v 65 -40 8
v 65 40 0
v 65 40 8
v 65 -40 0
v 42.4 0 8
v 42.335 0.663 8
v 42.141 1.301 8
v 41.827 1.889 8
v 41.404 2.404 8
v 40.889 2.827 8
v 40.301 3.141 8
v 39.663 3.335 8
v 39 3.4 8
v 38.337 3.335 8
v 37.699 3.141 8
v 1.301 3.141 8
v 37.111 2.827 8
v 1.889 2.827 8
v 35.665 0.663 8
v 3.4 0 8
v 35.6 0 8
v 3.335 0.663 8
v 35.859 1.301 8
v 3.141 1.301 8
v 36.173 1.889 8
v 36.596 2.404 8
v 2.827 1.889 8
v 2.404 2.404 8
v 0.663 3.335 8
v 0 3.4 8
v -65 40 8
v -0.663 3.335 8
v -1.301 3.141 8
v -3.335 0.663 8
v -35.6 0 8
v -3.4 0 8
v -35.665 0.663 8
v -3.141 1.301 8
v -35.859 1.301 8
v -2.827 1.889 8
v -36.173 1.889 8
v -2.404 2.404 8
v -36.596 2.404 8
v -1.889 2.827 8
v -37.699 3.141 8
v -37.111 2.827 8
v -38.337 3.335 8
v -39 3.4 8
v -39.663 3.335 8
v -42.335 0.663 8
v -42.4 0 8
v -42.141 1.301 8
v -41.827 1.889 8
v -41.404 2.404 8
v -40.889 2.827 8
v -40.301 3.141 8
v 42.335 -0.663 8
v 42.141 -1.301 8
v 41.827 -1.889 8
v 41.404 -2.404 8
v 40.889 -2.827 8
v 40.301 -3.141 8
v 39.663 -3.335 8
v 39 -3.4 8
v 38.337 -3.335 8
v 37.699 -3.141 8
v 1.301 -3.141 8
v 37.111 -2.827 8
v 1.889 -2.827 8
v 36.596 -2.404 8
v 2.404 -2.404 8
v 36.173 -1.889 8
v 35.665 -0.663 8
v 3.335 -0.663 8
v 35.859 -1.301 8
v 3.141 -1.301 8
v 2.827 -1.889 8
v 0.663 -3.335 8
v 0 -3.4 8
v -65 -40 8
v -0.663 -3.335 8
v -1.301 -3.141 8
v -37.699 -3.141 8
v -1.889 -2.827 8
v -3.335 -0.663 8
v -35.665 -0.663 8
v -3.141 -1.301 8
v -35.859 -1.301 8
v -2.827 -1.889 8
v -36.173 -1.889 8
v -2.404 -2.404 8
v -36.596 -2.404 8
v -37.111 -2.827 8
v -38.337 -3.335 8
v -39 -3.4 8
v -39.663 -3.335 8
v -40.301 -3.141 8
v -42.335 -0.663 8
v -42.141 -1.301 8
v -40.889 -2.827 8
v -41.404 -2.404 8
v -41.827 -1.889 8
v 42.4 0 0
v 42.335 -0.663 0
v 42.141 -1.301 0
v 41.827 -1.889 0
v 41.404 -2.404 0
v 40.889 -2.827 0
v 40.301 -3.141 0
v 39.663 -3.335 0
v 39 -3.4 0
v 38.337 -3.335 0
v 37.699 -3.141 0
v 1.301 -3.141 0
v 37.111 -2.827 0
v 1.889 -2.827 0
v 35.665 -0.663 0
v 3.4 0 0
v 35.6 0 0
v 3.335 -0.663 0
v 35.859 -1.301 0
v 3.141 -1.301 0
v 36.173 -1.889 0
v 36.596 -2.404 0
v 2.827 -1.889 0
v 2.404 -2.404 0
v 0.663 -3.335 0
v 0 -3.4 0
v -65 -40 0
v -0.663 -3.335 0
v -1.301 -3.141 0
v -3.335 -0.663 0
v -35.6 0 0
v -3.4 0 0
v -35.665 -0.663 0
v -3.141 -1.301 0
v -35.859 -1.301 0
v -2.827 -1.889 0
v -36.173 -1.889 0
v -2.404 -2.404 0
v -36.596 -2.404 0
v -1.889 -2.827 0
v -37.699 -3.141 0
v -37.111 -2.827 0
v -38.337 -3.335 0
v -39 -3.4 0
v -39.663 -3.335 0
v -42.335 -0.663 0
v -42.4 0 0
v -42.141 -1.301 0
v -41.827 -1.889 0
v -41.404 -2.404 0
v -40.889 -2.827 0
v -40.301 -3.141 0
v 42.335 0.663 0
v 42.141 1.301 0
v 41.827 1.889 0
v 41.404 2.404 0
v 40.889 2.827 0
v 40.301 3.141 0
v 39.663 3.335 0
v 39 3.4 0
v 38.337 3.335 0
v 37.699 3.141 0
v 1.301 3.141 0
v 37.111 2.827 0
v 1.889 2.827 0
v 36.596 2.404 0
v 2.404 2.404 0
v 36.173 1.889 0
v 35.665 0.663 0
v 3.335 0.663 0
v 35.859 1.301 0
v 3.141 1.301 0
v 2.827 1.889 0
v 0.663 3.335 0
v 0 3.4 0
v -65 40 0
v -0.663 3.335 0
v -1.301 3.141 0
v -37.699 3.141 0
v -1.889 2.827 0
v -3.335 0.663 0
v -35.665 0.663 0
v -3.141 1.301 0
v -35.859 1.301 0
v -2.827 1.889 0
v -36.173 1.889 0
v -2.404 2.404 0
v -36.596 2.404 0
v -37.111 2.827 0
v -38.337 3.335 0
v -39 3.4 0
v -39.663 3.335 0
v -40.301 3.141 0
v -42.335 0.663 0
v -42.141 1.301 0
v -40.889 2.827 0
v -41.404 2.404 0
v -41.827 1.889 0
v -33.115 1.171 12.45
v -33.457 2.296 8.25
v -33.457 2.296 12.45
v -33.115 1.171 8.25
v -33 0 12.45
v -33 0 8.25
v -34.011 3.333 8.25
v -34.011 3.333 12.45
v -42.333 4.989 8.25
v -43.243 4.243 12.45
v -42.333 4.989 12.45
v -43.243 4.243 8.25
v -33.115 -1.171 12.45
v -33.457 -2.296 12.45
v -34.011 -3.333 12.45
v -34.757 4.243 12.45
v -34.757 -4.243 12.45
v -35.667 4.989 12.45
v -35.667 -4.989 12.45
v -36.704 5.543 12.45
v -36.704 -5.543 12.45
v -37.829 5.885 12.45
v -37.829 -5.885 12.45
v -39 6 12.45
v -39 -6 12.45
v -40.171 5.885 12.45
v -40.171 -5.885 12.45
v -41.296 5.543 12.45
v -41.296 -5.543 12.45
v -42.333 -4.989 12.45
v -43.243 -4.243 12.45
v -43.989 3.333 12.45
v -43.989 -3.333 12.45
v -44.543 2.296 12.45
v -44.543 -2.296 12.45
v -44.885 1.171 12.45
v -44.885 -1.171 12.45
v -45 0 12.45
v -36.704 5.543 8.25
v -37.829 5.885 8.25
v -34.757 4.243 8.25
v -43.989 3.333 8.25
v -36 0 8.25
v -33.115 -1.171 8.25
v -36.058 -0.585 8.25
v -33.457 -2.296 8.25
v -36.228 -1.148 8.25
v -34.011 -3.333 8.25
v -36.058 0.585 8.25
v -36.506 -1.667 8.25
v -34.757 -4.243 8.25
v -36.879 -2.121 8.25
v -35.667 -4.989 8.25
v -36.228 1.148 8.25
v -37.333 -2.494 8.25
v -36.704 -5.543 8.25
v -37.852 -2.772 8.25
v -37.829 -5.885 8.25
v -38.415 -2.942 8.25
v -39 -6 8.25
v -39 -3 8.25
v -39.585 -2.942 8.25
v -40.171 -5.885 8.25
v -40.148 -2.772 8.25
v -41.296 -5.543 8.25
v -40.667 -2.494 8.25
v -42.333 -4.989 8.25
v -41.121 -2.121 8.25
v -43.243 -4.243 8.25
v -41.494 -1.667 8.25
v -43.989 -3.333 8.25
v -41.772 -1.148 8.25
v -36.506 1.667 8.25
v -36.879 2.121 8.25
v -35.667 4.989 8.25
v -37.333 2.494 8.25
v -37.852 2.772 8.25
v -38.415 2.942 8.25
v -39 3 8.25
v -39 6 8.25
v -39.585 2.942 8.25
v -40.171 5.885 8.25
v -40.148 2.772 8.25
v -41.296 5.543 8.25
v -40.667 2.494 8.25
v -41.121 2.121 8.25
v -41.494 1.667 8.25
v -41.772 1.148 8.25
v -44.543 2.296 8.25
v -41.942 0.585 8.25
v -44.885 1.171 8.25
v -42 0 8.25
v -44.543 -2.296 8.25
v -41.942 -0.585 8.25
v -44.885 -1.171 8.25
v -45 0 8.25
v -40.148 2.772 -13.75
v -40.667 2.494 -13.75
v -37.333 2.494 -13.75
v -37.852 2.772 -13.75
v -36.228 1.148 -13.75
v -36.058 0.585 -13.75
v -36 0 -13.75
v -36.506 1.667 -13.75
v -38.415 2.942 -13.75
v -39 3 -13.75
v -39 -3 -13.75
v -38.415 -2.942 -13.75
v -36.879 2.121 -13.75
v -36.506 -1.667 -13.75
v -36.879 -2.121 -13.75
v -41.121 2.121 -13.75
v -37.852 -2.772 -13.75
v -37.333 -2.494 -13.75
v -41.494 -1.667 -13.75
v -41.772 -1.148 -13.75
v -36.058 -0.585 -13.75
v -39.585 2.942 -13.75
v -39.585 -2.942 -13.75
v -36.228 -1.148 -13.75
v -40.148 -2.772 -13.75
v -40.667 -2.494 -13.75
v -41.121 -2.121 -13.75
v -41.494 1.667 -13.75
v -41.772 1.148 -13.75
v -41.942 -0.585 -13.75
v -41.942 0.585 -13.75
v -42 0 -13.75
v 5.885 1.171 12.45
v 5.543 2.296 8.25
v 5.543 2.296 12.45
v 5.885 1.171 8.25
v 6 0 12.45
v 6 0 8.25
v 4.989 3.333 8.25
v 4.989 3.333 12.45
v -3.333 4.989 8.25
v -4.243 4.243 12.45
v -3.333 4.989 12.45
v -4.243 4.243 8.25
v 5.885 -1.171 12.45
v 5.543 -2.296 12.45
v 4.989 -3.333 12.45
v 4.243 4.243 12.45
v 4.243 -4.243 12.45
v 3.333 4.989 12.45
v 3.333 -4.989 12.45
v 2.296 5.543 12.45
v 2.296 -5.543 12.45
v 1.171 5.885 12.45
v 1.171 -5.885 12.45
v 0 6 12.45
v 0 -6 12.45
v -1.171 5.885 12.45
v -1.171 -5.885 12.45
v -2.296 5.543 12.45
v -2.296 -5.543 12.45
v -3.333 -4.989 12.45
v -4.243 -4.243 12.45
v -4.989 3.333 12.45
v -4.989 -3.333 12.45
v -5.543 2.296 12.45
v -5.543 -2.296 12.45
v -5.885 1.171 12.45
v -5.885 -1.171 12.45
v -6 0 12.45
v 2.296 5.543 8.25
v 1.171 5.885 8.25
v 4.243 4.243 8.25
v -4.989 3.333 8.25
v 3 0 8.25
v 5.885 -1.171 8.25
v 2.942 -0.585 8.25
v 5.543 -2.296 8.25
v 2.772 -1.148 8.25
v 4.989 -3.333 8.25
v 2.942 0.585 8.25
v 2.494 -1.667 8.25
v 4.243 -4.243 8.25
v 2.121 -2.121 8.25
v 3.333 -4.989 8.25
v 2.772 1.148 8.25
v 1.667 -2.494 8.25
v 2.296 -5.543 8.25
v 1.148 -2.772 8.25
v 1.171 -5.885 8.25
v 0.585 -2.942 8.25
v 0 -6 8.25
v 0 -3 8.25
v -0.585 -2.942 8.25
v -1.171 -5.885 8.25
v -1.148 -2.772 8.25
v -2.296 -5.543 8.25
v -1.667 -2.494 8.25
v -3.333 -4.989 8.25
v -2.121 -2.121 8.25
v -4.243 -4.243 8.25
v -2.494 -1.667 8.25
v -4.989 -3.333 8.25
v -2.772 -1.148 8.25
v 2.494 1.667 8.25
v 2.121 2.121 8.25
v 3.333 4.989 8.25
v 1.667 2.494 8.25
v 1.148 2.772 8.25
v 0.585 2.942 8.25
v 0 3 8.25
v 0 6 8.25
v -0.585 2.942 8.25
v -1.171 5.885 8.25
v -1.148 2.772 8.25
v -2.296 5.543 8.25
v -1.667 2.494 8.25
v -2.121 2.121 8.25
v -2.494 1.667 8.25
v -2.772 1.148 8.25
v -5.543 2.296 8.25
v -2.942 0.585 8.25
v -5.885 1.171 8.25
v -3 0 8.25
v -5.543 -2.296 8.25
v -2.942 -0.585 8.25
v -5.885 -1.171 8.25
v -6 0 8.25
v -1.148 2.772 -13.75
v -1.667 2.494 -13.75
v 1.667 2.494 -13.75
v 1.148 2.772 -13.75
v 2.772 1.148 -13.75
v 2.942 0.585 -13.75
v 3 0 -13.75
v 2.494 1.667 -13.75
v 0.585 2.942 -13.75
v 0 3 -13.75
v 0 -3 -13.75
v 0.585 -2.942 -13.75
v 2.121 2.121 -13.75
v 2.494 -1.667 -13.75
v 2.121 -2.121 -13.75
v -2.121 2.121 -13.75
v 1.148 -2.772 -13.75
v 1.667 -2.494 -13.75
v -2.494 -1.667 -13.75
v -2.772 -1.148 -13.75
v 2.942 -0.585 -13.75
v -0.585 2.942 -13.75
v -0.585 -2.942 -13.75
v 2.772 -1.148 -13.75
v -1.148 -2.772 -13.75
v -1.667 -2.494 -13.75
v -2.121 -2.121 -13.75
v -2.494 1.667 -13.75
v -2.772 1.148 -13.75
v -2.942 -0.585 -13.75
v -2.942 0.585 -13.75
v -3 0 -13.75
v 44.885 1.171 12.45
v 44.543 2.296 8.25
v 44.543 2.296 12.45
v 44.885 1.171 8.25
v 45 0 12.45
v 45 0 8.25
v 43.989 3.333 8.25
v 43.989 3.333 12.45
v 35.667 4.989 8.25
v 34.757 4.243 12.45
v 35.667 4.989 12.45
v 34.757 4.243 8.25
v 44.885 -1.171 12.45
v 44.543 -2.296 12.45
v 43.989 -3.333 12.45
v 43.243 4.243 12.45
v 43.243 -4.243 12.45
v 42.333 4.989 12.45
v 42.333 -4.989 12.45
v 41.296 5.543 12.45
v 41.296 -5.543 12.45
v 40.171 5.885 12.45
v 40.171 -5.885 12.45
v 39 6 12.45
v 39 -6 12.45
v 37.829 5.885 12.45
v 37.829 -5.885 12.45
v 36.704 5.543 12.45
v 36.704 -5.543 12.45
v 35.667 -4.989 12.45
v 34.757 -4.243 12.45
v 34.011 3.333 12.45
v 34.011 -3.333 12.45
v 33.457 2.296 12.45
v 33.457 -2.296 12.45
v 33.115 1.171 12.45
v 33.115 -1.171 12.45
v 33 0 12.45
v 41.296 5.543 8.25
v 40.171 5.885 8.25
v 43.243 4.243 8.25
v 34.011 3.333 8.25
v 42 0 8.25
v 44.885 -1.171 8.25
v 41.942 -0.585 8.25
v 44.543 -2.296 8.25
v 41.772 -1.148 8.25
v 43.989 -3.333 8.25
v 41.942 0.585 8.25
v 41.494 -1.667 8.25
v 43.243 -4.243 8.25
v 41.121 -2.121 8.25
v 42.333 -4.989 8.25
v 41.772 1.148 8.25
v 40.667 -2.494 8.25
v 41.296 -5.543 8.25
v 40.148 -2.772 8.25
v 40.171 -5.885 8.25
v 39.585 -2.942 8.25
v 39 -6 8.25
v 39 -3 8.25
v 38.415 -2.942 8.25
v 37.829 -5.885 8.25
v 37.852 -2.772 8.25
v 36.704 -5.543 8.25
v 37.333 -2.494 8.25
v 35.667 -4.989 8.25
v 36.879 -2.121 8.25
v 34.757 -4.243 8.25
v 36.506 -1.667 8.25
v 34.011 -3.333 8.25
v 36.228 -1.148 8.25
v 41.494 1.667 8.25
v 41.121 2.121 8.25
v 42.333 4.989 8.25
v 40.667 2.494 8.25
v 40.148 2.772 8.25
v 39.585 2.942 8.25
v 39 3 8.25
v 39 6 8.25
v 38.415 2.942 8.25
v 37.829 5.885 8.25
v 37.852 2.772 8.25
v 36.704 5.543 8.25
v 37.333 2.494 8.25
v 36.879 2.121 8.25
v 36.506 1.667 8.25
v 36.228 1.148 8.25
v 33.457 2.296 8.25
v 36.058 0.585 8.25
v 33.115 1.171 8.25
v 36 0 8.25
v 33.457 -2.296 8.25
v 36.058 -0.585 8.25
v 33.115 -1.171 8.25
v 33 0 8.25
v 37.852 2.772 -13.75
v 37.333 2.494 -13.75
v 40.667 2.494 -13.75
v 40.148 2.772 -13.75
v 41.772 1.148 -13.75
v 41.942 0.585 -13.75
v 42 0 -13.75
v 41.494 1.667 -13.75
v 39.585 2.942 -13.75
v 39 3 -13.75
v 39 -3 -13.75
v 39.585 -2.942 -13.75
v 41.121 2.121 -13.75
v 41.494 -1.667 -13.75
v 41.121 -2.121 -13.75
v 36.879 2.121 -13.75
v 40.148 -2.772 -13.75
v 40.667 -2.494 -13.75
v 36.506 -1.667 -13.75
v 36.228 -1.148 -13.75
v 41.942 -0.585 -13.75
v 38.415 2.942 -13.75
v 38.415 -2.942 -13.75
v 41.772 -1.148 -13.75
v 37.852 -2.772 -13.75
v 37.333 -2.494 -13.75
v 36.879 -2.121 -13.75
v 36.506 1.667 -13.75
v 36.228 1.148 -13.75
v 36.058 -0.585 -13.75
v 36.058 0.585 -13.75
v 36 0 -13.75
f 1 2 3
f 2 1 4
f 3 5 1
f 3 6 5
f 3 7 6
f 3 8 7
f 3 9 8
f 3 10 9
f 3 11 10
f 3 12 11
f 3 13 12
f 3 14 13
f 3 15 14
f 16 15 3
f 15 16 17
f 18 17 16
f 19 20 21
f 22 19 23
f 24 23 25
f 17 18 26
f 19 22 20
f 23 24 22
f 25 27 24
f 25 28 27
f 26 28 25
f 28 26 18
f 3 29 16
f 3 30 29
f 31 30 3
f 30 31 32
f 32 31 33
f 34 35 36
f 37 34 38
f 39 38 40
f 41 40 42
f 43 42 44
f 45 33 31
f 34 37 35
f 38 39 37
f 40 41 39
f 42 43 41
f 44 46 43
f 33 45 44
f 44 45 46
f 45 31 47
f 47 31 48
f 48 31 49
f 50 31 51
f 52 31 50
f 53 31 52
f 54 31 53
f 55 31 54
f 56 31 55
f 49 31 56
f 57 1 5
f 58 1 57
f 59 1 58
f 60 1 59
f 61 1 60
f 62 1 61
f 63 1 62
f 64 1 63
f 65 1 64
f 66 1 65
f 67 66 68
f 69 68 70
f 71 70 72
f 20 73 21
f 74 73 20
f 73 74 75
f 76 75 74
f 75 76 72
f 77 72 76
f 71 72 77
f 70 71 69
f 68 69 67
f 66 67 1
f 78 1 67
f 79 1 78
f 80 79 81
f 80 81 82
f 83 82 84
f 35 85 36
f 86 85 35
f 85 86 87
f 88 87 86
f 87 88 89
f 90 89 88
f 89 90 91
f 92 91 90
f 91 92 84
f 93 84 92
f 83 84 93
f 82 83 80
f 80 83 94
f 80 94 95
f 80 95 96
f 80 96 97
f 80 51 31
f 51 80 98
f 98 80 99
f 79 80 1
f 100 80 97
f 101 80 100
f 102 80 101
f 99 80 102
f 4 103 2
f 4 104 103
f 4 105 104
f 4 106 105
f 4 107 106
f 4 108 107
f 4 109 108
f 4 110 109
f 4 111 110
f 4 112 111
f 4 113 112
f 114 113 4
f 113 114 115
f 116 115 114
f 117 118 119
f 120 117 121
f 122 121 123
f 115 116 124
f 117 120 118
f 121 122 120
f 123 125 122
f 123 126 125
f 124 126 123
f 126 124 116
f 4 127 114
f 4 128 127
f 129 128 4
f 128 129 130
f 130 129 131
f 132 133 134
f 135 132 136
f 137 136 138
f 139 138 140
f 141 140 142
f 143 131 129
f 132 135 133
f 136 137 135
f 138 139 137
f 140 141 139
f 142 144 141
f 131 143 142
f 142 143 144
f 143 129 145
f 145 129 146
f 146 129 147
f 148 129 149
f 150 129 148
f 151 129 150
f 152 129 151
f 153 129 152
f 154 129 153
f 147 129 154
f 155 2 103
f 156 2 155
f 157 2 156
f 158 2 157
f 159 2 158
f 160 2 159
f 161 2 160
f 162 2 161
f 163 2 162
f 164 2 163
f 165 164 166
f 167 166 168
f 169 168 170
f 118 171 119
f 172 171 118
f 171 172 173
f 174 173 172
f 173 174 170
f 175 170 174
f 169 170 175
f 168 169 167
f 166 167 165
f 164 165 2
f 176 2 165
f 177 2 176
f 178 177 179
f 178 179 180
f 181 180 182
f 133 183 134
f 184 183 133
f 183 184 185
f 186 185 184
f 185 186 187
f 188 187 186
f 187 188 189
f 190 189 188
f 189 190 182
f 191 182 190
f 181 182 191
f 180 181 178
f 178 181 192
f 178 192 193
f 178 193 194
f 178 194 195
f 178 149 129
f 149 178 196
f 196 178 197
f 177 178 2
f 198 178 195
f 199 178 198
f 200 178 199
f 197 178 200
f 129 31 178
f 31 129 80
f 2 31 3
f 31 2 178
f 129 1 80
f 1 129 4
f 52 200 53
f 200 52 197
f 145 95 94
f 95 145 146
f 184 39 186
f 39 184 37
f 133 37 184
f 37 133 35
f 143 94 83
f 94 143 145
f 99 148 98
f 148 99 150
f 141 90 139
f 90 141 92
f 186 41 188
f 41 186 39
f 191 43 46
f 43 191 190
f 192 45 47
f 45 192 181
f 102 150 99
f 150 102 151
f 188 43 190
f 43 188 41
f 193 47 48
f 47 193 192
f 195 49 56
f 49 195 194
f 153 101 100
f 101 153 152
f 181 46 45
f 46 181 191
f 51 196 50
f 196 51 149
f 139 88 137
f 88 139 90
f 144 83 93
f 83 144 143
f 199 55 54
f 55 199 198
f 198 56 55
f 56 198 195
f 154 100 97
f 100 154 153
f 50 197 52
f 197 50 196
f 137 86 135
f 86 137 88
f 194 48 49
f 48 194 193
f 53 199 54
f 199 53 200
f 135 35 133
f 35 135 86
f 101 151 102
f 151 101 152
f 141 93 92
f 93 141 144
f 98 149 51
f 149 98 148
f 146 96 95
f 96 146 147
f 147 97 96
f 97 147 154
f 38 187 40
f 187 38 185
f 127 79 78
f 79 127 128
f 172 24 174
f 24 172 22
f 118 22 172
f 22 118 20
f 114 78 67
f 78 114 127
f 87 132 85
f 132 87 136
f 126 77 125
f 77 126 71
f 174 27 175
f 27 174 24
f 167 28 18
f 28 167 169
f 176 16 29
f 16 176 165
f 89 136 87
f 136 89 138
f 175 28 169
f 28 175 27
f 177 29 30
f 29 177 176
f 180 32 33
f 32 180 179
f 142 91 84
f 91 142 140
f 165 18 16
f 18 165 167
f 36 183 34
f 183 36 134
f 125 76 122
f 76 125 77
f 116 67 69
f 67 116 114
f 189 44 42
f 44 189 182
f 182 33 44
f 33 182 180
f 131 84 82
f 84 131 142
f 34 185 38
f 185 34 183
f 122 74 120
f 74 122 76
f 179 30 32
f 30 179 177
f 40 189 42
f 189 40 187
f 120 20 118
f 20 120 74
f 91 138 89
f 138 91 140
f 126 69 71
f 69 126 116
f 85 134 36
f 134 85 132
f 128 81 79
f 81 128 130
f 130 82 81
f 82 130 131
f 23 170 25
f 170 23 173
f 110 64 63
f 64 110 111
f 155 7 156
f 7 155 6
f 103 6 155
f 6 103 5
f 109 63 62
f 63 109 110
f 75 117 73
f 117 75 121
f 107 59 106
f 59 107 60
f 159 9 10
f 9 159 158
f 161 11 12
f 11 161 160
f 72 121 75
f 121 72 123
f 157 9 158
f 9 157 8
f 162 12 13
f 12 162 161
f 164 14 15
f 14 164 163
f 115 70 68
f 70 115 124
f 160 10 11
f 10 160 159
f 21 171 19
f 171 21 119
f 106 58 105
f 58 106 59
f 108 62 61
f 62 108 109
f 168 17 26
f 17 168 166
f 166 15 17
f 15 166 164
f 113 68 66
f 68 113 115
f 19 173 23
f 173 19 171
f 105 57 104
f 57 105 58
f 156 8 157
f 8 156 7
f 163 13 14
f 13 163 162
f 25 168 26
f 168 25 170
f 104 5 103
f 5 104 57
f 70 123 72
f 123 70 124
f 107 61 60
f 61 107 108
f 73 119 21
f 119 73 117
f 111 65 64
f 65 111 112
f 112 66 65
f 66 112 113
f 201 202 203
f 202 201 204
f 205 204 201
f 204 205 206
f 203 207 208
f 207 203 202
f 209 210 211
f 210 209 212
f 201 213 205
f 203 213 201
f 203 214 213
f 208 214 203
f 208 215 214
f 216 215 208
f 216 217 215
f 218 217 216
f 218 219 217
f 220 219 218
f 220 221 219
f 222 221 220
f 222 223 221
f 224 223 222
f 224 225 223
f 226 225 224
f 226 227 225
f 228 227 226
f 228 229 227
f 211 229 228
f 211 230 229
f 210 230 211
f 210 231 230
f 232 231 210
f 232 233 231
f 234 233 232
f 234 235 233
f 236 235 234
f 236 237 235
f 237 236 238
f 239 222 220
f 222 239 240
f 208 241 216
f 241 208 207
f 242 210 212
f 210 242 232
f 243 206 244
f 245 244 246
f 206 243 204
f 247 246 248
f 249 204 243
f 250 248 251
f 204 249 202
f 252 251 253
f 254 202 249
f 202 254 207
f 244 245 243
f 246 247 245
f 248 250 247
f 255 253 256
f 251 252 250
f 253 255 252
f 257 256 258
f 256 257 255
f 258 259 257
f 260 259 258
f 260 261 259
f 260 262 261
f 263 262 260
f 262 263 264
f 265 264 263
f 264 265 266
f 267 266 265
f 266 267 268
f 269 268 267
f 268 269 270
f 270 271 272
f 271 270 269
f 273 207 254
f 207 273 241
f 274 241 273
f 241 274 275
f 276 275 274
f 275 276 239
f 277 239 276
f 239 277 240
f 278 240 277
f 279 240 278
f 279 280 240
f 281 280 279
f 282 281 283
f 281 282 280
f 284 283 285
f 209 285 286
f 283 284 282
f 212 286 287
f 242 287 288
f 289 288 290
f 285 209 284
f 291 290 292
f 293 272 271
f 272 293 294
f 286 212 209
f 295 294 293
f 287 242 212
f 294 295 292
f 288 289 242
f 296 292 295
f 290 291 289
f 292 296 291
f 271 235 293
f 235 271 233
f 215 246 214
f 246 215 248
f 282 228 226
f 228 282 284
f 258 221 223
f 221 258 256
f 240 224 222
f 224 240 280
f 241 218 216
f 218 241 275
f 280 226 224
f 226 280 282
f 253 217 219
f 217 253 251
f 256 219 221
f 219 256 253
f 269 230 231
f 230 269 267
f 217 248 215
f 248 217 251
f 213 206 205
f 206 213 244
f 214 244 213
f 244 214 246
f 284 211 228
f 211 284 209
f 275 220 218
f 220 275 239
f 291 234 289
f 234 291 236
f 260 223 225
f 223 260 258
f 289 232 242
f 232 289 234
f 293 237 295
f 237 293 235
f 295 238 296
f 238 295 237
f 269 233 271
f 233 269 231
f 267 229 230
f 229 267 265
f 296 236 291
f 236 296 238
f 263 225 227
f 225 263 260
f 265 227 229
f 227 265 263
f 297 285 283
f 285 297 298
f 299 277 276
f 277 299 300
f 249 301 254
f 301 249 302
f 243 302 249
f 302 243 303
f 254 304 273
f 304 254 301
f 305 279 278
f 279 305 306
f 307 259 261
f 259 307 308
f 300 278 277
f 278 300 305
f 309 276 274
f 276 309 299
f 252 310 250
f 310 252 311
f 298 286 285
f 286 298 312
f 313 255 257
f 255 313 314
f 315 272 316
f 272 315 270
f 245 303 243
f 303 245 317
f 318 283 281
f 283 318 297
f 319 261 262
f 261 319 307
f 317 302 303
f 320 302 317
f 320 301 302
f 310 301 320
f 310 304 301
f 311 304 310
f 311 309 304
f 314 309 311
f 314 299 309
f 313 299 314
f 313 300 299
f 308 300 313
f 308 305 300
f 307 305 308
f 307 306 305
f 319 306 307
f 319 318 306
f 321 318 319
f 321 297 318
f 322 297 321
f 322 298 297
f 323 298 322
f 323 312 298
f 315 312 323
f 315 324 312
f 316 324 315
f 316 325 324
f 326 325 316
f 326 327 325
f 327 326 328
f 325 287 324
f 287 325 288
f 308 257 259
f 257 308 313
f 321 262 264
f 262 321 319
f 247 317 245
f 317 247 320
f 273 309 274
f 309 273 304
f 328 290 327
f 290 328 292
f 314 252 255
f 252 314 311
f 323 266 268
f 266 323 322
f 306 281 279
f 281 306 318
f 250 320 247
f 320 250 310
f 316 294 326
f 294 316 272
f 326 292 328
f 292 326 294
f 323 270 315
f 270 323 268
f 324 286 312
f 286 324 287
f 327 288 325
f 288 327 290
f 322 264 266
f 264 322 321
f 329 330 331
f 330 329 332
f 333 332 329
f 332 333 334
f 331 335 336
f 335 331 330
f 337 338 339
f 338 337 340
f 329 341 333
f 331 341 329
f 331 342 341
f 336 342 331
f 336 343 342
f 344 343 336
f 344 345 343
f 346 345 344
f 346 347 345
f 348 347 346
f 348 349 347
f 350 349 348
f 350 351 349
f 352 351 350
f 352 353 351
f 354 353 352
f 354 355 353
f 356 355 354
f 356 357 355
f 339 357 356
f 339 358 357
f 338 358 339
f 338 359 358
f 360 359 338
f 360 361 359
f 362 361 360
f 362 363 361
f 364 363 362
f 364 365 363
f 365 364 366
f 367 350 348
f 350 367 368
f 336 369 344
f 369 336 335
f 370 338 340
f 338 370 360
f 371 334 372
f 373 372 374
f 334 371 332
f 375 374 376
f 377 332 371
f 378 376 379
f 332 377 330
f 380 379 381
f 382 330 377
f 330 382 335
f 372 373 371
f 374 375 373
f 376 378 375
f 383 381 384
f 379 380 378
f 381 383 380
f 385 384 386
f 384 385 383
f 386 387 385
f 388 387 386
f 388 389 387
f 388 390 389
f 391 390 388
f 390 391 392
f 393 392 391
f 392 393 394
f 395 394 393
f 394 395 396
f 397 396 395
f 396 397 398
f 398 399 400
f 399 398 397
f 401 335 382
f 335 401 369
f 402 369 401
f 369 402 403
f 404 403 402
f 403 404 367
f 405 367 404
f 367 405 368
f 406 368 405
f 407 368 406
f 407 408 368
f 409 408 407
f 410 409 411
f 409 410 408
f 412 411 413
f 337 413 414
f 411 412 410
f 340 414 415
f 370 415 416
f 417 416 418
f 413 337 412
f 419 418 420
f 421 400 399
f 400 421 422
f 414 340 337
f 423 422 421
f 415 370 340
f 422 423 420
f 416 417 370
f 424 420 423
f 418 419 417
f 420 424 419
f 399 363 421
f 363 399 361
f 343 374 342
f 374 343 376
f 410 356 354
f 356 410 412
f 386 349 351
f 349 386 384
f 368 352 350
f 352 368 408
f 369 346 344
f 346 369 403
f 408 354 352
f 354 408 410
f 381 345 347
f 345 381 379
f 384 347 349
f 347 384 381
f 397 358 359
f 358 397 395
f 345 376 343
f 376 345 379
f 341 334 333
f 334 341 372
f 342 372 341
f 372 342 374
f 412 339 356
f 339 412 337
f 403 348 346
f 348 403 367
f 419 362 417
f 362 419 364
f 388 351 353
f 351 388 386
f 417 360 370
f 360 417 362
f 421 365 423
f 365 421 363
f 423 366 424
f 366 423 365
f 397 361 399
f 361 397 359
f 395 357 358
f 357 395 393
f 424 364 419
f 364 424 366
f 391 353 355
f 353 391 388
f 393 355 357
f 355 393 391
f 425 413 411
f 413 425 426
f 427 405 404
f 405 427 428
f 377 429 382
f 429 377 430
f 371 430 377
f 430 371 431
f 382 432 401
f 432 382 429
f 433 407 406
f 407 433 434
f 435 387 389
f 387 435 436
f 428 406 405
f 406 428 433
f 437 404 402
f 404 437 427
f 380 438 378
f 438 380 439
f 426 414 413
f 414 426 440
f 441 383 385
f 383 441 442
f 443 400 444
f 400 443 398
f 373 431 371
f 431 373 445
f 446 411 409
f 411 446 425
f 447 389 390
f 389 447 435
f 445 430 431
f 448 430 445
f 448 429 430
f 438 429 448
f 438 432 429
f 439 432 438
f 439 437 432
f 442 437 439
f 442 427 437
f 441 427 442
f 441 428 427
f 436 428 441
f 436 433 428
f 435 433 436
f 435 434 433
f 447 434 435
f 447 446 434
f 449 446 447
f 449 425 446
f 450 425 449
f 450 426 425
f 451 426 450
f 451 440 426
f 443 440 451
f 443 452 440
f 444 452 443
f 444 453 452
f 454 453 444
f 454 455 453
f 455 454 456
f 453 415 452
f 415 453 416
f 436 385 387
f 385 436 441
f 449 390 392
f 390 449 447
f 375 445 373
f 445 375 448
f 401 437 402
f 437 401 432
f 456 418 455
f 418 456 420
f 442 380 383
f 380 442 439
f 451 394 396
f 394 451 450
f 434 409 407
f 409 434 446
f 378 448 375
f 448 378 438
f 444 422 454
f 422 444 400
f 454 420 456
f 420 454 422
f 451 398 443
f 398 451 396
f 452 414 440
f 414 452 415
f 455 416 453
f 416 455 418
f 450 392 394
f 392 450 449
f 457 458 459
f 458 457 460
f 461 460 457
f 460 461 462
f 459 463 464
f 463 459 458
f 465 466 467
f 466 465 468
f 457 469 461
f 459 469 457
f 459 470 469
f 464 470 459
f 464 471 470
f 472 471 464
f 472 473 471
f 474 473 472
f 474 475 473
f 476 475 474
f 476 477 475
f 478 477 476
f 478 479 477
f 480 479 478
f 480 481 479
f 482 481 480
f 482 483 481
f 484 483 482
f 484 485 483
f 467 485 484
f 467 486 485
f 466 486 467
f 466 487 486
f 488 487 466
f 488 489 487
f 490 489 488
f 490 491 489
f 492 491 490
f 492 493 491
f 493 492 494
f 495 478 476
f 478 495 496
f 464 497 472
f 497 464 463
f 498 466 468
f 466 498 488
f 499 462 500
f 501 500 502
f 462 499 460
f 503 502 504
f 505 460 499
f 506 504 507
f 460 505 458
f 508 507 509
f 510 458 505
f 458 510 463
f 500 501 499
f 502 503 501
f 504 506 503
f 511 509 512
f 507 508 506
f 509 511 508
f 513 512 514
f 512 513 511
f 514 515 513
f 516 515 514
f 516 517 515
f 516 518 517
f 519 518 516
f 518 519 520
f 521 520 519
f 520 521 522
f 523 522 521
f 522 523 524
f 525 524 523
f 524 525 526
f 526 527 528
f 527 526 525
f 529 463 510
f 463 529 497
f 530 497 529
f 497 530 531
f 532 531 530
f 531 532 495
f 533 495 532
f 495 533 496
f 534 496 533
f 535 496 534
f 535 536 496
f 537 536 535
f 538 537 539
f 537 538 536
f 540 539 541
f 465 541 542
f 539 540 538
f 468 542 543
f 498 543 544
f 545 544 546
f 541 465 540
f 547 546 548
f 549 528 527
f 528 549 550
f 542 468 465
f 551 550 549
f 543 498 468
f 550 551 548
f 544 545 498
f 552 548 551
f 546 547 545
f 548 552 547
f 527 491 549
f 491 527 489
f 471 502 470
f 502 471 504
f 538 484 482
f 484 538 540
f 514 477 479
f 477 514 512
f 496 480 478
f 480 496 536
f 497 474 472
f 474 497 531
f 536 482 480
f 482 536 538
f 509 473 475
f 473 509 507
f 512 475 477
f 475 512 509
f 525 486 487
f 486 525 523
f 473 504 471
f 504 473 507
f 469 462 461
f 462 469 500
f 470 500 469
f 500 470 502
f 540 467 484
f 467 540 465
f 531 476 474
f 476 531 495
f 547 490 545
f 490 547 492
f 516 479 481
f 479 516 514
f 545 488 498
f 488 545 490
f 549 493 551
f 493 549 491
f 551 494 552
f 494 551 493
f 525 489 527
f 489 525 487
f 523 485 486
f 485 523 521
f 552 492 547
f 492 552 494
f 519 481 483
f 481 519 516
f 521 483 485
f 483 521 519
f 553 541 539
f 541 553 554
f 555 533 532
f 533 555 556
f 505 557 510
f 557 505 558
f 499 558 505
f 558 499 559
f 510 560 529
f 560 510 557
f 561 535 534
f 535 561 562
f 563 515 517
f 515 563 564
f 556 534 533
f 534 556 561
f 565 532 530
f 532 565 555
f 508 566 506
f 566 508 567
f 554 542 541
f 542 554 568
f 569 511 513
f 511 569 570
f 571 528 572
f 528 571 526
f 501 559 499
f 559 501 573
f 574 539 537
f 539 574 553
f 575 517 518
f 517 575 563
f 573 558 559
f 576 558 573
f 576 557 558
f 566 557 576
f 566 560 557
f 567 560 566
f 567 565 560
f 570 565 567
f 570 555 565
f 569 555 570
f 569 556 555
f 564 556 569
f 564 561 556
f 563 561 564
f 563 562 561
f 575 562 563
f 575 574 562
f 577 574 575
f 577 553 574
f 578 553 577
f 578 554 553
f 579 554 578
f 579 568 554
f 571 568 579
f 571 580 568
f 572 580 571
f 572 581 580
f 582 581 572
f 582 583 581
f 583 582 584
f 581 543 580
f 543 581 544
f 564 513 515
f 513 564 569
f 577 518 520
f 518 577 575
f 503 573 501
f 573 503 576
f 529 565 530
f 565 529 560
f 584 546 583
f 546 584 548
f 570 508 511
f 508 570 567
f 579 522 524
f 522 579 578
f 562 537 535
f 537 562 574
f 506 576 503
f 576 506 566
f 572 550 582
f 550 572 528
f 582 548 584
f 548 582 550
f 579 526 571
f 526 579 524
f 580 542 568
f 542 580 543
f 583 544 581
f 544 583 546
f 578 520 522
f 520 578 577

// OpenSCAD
$fn = 32;

// ------------------------------------------------------------------------
// Bolted plate: 130 x 80 x 8 mm plate, 3 fasteners
// Every part is its own module, assembly() places them once.
// ------------------------------------------------------------------------

// --- part 1 ---
module plate() {
  difference() {
    translate([-65, -40, 0]) cube([130, 80, 8]);
    translate([-39, 0, -1]) cylinder(h = 10, d = 6.8);
    translate([0, 0, -1]) cylinder(h = 10, d = 6.8);
    translate([39, 0, -1]) cylinder(h = 10, d = 6.8);
  }
}

// --- part 2 ---
module bolt1() {
  cylinder(h = 4.2, d = 12);
  translate([0, 0, -22]) cylinder(h = 22, d = 6);
}

// --- part 3 ---
module bolt2() {
  cylinder(h = 4.2, d = 12);
  translate([0, 0, -22]) cylinder(h = 22, d = 6);
}

// --- part 4 ---
module bolt3() {
  cylinder(h = 4.2, d = 12);
  translate([0, 0, -22]) cylinder(h = 22, d = 6);
}

// --- assembly ---
module assembly() {
  translate([0, 0, 0]) rotate([0, 0, 0]) plate();
  translate([-39, 0, 8.25]) rotate([0, 0, 0]) bolt1();
  translate([0, 0, 8.25]) rotate([0, 0, 0]) bolt2();
  translate([39, 0, 8.25]) rotate([0, 0, 0]) bolt3();
}

assembly();
